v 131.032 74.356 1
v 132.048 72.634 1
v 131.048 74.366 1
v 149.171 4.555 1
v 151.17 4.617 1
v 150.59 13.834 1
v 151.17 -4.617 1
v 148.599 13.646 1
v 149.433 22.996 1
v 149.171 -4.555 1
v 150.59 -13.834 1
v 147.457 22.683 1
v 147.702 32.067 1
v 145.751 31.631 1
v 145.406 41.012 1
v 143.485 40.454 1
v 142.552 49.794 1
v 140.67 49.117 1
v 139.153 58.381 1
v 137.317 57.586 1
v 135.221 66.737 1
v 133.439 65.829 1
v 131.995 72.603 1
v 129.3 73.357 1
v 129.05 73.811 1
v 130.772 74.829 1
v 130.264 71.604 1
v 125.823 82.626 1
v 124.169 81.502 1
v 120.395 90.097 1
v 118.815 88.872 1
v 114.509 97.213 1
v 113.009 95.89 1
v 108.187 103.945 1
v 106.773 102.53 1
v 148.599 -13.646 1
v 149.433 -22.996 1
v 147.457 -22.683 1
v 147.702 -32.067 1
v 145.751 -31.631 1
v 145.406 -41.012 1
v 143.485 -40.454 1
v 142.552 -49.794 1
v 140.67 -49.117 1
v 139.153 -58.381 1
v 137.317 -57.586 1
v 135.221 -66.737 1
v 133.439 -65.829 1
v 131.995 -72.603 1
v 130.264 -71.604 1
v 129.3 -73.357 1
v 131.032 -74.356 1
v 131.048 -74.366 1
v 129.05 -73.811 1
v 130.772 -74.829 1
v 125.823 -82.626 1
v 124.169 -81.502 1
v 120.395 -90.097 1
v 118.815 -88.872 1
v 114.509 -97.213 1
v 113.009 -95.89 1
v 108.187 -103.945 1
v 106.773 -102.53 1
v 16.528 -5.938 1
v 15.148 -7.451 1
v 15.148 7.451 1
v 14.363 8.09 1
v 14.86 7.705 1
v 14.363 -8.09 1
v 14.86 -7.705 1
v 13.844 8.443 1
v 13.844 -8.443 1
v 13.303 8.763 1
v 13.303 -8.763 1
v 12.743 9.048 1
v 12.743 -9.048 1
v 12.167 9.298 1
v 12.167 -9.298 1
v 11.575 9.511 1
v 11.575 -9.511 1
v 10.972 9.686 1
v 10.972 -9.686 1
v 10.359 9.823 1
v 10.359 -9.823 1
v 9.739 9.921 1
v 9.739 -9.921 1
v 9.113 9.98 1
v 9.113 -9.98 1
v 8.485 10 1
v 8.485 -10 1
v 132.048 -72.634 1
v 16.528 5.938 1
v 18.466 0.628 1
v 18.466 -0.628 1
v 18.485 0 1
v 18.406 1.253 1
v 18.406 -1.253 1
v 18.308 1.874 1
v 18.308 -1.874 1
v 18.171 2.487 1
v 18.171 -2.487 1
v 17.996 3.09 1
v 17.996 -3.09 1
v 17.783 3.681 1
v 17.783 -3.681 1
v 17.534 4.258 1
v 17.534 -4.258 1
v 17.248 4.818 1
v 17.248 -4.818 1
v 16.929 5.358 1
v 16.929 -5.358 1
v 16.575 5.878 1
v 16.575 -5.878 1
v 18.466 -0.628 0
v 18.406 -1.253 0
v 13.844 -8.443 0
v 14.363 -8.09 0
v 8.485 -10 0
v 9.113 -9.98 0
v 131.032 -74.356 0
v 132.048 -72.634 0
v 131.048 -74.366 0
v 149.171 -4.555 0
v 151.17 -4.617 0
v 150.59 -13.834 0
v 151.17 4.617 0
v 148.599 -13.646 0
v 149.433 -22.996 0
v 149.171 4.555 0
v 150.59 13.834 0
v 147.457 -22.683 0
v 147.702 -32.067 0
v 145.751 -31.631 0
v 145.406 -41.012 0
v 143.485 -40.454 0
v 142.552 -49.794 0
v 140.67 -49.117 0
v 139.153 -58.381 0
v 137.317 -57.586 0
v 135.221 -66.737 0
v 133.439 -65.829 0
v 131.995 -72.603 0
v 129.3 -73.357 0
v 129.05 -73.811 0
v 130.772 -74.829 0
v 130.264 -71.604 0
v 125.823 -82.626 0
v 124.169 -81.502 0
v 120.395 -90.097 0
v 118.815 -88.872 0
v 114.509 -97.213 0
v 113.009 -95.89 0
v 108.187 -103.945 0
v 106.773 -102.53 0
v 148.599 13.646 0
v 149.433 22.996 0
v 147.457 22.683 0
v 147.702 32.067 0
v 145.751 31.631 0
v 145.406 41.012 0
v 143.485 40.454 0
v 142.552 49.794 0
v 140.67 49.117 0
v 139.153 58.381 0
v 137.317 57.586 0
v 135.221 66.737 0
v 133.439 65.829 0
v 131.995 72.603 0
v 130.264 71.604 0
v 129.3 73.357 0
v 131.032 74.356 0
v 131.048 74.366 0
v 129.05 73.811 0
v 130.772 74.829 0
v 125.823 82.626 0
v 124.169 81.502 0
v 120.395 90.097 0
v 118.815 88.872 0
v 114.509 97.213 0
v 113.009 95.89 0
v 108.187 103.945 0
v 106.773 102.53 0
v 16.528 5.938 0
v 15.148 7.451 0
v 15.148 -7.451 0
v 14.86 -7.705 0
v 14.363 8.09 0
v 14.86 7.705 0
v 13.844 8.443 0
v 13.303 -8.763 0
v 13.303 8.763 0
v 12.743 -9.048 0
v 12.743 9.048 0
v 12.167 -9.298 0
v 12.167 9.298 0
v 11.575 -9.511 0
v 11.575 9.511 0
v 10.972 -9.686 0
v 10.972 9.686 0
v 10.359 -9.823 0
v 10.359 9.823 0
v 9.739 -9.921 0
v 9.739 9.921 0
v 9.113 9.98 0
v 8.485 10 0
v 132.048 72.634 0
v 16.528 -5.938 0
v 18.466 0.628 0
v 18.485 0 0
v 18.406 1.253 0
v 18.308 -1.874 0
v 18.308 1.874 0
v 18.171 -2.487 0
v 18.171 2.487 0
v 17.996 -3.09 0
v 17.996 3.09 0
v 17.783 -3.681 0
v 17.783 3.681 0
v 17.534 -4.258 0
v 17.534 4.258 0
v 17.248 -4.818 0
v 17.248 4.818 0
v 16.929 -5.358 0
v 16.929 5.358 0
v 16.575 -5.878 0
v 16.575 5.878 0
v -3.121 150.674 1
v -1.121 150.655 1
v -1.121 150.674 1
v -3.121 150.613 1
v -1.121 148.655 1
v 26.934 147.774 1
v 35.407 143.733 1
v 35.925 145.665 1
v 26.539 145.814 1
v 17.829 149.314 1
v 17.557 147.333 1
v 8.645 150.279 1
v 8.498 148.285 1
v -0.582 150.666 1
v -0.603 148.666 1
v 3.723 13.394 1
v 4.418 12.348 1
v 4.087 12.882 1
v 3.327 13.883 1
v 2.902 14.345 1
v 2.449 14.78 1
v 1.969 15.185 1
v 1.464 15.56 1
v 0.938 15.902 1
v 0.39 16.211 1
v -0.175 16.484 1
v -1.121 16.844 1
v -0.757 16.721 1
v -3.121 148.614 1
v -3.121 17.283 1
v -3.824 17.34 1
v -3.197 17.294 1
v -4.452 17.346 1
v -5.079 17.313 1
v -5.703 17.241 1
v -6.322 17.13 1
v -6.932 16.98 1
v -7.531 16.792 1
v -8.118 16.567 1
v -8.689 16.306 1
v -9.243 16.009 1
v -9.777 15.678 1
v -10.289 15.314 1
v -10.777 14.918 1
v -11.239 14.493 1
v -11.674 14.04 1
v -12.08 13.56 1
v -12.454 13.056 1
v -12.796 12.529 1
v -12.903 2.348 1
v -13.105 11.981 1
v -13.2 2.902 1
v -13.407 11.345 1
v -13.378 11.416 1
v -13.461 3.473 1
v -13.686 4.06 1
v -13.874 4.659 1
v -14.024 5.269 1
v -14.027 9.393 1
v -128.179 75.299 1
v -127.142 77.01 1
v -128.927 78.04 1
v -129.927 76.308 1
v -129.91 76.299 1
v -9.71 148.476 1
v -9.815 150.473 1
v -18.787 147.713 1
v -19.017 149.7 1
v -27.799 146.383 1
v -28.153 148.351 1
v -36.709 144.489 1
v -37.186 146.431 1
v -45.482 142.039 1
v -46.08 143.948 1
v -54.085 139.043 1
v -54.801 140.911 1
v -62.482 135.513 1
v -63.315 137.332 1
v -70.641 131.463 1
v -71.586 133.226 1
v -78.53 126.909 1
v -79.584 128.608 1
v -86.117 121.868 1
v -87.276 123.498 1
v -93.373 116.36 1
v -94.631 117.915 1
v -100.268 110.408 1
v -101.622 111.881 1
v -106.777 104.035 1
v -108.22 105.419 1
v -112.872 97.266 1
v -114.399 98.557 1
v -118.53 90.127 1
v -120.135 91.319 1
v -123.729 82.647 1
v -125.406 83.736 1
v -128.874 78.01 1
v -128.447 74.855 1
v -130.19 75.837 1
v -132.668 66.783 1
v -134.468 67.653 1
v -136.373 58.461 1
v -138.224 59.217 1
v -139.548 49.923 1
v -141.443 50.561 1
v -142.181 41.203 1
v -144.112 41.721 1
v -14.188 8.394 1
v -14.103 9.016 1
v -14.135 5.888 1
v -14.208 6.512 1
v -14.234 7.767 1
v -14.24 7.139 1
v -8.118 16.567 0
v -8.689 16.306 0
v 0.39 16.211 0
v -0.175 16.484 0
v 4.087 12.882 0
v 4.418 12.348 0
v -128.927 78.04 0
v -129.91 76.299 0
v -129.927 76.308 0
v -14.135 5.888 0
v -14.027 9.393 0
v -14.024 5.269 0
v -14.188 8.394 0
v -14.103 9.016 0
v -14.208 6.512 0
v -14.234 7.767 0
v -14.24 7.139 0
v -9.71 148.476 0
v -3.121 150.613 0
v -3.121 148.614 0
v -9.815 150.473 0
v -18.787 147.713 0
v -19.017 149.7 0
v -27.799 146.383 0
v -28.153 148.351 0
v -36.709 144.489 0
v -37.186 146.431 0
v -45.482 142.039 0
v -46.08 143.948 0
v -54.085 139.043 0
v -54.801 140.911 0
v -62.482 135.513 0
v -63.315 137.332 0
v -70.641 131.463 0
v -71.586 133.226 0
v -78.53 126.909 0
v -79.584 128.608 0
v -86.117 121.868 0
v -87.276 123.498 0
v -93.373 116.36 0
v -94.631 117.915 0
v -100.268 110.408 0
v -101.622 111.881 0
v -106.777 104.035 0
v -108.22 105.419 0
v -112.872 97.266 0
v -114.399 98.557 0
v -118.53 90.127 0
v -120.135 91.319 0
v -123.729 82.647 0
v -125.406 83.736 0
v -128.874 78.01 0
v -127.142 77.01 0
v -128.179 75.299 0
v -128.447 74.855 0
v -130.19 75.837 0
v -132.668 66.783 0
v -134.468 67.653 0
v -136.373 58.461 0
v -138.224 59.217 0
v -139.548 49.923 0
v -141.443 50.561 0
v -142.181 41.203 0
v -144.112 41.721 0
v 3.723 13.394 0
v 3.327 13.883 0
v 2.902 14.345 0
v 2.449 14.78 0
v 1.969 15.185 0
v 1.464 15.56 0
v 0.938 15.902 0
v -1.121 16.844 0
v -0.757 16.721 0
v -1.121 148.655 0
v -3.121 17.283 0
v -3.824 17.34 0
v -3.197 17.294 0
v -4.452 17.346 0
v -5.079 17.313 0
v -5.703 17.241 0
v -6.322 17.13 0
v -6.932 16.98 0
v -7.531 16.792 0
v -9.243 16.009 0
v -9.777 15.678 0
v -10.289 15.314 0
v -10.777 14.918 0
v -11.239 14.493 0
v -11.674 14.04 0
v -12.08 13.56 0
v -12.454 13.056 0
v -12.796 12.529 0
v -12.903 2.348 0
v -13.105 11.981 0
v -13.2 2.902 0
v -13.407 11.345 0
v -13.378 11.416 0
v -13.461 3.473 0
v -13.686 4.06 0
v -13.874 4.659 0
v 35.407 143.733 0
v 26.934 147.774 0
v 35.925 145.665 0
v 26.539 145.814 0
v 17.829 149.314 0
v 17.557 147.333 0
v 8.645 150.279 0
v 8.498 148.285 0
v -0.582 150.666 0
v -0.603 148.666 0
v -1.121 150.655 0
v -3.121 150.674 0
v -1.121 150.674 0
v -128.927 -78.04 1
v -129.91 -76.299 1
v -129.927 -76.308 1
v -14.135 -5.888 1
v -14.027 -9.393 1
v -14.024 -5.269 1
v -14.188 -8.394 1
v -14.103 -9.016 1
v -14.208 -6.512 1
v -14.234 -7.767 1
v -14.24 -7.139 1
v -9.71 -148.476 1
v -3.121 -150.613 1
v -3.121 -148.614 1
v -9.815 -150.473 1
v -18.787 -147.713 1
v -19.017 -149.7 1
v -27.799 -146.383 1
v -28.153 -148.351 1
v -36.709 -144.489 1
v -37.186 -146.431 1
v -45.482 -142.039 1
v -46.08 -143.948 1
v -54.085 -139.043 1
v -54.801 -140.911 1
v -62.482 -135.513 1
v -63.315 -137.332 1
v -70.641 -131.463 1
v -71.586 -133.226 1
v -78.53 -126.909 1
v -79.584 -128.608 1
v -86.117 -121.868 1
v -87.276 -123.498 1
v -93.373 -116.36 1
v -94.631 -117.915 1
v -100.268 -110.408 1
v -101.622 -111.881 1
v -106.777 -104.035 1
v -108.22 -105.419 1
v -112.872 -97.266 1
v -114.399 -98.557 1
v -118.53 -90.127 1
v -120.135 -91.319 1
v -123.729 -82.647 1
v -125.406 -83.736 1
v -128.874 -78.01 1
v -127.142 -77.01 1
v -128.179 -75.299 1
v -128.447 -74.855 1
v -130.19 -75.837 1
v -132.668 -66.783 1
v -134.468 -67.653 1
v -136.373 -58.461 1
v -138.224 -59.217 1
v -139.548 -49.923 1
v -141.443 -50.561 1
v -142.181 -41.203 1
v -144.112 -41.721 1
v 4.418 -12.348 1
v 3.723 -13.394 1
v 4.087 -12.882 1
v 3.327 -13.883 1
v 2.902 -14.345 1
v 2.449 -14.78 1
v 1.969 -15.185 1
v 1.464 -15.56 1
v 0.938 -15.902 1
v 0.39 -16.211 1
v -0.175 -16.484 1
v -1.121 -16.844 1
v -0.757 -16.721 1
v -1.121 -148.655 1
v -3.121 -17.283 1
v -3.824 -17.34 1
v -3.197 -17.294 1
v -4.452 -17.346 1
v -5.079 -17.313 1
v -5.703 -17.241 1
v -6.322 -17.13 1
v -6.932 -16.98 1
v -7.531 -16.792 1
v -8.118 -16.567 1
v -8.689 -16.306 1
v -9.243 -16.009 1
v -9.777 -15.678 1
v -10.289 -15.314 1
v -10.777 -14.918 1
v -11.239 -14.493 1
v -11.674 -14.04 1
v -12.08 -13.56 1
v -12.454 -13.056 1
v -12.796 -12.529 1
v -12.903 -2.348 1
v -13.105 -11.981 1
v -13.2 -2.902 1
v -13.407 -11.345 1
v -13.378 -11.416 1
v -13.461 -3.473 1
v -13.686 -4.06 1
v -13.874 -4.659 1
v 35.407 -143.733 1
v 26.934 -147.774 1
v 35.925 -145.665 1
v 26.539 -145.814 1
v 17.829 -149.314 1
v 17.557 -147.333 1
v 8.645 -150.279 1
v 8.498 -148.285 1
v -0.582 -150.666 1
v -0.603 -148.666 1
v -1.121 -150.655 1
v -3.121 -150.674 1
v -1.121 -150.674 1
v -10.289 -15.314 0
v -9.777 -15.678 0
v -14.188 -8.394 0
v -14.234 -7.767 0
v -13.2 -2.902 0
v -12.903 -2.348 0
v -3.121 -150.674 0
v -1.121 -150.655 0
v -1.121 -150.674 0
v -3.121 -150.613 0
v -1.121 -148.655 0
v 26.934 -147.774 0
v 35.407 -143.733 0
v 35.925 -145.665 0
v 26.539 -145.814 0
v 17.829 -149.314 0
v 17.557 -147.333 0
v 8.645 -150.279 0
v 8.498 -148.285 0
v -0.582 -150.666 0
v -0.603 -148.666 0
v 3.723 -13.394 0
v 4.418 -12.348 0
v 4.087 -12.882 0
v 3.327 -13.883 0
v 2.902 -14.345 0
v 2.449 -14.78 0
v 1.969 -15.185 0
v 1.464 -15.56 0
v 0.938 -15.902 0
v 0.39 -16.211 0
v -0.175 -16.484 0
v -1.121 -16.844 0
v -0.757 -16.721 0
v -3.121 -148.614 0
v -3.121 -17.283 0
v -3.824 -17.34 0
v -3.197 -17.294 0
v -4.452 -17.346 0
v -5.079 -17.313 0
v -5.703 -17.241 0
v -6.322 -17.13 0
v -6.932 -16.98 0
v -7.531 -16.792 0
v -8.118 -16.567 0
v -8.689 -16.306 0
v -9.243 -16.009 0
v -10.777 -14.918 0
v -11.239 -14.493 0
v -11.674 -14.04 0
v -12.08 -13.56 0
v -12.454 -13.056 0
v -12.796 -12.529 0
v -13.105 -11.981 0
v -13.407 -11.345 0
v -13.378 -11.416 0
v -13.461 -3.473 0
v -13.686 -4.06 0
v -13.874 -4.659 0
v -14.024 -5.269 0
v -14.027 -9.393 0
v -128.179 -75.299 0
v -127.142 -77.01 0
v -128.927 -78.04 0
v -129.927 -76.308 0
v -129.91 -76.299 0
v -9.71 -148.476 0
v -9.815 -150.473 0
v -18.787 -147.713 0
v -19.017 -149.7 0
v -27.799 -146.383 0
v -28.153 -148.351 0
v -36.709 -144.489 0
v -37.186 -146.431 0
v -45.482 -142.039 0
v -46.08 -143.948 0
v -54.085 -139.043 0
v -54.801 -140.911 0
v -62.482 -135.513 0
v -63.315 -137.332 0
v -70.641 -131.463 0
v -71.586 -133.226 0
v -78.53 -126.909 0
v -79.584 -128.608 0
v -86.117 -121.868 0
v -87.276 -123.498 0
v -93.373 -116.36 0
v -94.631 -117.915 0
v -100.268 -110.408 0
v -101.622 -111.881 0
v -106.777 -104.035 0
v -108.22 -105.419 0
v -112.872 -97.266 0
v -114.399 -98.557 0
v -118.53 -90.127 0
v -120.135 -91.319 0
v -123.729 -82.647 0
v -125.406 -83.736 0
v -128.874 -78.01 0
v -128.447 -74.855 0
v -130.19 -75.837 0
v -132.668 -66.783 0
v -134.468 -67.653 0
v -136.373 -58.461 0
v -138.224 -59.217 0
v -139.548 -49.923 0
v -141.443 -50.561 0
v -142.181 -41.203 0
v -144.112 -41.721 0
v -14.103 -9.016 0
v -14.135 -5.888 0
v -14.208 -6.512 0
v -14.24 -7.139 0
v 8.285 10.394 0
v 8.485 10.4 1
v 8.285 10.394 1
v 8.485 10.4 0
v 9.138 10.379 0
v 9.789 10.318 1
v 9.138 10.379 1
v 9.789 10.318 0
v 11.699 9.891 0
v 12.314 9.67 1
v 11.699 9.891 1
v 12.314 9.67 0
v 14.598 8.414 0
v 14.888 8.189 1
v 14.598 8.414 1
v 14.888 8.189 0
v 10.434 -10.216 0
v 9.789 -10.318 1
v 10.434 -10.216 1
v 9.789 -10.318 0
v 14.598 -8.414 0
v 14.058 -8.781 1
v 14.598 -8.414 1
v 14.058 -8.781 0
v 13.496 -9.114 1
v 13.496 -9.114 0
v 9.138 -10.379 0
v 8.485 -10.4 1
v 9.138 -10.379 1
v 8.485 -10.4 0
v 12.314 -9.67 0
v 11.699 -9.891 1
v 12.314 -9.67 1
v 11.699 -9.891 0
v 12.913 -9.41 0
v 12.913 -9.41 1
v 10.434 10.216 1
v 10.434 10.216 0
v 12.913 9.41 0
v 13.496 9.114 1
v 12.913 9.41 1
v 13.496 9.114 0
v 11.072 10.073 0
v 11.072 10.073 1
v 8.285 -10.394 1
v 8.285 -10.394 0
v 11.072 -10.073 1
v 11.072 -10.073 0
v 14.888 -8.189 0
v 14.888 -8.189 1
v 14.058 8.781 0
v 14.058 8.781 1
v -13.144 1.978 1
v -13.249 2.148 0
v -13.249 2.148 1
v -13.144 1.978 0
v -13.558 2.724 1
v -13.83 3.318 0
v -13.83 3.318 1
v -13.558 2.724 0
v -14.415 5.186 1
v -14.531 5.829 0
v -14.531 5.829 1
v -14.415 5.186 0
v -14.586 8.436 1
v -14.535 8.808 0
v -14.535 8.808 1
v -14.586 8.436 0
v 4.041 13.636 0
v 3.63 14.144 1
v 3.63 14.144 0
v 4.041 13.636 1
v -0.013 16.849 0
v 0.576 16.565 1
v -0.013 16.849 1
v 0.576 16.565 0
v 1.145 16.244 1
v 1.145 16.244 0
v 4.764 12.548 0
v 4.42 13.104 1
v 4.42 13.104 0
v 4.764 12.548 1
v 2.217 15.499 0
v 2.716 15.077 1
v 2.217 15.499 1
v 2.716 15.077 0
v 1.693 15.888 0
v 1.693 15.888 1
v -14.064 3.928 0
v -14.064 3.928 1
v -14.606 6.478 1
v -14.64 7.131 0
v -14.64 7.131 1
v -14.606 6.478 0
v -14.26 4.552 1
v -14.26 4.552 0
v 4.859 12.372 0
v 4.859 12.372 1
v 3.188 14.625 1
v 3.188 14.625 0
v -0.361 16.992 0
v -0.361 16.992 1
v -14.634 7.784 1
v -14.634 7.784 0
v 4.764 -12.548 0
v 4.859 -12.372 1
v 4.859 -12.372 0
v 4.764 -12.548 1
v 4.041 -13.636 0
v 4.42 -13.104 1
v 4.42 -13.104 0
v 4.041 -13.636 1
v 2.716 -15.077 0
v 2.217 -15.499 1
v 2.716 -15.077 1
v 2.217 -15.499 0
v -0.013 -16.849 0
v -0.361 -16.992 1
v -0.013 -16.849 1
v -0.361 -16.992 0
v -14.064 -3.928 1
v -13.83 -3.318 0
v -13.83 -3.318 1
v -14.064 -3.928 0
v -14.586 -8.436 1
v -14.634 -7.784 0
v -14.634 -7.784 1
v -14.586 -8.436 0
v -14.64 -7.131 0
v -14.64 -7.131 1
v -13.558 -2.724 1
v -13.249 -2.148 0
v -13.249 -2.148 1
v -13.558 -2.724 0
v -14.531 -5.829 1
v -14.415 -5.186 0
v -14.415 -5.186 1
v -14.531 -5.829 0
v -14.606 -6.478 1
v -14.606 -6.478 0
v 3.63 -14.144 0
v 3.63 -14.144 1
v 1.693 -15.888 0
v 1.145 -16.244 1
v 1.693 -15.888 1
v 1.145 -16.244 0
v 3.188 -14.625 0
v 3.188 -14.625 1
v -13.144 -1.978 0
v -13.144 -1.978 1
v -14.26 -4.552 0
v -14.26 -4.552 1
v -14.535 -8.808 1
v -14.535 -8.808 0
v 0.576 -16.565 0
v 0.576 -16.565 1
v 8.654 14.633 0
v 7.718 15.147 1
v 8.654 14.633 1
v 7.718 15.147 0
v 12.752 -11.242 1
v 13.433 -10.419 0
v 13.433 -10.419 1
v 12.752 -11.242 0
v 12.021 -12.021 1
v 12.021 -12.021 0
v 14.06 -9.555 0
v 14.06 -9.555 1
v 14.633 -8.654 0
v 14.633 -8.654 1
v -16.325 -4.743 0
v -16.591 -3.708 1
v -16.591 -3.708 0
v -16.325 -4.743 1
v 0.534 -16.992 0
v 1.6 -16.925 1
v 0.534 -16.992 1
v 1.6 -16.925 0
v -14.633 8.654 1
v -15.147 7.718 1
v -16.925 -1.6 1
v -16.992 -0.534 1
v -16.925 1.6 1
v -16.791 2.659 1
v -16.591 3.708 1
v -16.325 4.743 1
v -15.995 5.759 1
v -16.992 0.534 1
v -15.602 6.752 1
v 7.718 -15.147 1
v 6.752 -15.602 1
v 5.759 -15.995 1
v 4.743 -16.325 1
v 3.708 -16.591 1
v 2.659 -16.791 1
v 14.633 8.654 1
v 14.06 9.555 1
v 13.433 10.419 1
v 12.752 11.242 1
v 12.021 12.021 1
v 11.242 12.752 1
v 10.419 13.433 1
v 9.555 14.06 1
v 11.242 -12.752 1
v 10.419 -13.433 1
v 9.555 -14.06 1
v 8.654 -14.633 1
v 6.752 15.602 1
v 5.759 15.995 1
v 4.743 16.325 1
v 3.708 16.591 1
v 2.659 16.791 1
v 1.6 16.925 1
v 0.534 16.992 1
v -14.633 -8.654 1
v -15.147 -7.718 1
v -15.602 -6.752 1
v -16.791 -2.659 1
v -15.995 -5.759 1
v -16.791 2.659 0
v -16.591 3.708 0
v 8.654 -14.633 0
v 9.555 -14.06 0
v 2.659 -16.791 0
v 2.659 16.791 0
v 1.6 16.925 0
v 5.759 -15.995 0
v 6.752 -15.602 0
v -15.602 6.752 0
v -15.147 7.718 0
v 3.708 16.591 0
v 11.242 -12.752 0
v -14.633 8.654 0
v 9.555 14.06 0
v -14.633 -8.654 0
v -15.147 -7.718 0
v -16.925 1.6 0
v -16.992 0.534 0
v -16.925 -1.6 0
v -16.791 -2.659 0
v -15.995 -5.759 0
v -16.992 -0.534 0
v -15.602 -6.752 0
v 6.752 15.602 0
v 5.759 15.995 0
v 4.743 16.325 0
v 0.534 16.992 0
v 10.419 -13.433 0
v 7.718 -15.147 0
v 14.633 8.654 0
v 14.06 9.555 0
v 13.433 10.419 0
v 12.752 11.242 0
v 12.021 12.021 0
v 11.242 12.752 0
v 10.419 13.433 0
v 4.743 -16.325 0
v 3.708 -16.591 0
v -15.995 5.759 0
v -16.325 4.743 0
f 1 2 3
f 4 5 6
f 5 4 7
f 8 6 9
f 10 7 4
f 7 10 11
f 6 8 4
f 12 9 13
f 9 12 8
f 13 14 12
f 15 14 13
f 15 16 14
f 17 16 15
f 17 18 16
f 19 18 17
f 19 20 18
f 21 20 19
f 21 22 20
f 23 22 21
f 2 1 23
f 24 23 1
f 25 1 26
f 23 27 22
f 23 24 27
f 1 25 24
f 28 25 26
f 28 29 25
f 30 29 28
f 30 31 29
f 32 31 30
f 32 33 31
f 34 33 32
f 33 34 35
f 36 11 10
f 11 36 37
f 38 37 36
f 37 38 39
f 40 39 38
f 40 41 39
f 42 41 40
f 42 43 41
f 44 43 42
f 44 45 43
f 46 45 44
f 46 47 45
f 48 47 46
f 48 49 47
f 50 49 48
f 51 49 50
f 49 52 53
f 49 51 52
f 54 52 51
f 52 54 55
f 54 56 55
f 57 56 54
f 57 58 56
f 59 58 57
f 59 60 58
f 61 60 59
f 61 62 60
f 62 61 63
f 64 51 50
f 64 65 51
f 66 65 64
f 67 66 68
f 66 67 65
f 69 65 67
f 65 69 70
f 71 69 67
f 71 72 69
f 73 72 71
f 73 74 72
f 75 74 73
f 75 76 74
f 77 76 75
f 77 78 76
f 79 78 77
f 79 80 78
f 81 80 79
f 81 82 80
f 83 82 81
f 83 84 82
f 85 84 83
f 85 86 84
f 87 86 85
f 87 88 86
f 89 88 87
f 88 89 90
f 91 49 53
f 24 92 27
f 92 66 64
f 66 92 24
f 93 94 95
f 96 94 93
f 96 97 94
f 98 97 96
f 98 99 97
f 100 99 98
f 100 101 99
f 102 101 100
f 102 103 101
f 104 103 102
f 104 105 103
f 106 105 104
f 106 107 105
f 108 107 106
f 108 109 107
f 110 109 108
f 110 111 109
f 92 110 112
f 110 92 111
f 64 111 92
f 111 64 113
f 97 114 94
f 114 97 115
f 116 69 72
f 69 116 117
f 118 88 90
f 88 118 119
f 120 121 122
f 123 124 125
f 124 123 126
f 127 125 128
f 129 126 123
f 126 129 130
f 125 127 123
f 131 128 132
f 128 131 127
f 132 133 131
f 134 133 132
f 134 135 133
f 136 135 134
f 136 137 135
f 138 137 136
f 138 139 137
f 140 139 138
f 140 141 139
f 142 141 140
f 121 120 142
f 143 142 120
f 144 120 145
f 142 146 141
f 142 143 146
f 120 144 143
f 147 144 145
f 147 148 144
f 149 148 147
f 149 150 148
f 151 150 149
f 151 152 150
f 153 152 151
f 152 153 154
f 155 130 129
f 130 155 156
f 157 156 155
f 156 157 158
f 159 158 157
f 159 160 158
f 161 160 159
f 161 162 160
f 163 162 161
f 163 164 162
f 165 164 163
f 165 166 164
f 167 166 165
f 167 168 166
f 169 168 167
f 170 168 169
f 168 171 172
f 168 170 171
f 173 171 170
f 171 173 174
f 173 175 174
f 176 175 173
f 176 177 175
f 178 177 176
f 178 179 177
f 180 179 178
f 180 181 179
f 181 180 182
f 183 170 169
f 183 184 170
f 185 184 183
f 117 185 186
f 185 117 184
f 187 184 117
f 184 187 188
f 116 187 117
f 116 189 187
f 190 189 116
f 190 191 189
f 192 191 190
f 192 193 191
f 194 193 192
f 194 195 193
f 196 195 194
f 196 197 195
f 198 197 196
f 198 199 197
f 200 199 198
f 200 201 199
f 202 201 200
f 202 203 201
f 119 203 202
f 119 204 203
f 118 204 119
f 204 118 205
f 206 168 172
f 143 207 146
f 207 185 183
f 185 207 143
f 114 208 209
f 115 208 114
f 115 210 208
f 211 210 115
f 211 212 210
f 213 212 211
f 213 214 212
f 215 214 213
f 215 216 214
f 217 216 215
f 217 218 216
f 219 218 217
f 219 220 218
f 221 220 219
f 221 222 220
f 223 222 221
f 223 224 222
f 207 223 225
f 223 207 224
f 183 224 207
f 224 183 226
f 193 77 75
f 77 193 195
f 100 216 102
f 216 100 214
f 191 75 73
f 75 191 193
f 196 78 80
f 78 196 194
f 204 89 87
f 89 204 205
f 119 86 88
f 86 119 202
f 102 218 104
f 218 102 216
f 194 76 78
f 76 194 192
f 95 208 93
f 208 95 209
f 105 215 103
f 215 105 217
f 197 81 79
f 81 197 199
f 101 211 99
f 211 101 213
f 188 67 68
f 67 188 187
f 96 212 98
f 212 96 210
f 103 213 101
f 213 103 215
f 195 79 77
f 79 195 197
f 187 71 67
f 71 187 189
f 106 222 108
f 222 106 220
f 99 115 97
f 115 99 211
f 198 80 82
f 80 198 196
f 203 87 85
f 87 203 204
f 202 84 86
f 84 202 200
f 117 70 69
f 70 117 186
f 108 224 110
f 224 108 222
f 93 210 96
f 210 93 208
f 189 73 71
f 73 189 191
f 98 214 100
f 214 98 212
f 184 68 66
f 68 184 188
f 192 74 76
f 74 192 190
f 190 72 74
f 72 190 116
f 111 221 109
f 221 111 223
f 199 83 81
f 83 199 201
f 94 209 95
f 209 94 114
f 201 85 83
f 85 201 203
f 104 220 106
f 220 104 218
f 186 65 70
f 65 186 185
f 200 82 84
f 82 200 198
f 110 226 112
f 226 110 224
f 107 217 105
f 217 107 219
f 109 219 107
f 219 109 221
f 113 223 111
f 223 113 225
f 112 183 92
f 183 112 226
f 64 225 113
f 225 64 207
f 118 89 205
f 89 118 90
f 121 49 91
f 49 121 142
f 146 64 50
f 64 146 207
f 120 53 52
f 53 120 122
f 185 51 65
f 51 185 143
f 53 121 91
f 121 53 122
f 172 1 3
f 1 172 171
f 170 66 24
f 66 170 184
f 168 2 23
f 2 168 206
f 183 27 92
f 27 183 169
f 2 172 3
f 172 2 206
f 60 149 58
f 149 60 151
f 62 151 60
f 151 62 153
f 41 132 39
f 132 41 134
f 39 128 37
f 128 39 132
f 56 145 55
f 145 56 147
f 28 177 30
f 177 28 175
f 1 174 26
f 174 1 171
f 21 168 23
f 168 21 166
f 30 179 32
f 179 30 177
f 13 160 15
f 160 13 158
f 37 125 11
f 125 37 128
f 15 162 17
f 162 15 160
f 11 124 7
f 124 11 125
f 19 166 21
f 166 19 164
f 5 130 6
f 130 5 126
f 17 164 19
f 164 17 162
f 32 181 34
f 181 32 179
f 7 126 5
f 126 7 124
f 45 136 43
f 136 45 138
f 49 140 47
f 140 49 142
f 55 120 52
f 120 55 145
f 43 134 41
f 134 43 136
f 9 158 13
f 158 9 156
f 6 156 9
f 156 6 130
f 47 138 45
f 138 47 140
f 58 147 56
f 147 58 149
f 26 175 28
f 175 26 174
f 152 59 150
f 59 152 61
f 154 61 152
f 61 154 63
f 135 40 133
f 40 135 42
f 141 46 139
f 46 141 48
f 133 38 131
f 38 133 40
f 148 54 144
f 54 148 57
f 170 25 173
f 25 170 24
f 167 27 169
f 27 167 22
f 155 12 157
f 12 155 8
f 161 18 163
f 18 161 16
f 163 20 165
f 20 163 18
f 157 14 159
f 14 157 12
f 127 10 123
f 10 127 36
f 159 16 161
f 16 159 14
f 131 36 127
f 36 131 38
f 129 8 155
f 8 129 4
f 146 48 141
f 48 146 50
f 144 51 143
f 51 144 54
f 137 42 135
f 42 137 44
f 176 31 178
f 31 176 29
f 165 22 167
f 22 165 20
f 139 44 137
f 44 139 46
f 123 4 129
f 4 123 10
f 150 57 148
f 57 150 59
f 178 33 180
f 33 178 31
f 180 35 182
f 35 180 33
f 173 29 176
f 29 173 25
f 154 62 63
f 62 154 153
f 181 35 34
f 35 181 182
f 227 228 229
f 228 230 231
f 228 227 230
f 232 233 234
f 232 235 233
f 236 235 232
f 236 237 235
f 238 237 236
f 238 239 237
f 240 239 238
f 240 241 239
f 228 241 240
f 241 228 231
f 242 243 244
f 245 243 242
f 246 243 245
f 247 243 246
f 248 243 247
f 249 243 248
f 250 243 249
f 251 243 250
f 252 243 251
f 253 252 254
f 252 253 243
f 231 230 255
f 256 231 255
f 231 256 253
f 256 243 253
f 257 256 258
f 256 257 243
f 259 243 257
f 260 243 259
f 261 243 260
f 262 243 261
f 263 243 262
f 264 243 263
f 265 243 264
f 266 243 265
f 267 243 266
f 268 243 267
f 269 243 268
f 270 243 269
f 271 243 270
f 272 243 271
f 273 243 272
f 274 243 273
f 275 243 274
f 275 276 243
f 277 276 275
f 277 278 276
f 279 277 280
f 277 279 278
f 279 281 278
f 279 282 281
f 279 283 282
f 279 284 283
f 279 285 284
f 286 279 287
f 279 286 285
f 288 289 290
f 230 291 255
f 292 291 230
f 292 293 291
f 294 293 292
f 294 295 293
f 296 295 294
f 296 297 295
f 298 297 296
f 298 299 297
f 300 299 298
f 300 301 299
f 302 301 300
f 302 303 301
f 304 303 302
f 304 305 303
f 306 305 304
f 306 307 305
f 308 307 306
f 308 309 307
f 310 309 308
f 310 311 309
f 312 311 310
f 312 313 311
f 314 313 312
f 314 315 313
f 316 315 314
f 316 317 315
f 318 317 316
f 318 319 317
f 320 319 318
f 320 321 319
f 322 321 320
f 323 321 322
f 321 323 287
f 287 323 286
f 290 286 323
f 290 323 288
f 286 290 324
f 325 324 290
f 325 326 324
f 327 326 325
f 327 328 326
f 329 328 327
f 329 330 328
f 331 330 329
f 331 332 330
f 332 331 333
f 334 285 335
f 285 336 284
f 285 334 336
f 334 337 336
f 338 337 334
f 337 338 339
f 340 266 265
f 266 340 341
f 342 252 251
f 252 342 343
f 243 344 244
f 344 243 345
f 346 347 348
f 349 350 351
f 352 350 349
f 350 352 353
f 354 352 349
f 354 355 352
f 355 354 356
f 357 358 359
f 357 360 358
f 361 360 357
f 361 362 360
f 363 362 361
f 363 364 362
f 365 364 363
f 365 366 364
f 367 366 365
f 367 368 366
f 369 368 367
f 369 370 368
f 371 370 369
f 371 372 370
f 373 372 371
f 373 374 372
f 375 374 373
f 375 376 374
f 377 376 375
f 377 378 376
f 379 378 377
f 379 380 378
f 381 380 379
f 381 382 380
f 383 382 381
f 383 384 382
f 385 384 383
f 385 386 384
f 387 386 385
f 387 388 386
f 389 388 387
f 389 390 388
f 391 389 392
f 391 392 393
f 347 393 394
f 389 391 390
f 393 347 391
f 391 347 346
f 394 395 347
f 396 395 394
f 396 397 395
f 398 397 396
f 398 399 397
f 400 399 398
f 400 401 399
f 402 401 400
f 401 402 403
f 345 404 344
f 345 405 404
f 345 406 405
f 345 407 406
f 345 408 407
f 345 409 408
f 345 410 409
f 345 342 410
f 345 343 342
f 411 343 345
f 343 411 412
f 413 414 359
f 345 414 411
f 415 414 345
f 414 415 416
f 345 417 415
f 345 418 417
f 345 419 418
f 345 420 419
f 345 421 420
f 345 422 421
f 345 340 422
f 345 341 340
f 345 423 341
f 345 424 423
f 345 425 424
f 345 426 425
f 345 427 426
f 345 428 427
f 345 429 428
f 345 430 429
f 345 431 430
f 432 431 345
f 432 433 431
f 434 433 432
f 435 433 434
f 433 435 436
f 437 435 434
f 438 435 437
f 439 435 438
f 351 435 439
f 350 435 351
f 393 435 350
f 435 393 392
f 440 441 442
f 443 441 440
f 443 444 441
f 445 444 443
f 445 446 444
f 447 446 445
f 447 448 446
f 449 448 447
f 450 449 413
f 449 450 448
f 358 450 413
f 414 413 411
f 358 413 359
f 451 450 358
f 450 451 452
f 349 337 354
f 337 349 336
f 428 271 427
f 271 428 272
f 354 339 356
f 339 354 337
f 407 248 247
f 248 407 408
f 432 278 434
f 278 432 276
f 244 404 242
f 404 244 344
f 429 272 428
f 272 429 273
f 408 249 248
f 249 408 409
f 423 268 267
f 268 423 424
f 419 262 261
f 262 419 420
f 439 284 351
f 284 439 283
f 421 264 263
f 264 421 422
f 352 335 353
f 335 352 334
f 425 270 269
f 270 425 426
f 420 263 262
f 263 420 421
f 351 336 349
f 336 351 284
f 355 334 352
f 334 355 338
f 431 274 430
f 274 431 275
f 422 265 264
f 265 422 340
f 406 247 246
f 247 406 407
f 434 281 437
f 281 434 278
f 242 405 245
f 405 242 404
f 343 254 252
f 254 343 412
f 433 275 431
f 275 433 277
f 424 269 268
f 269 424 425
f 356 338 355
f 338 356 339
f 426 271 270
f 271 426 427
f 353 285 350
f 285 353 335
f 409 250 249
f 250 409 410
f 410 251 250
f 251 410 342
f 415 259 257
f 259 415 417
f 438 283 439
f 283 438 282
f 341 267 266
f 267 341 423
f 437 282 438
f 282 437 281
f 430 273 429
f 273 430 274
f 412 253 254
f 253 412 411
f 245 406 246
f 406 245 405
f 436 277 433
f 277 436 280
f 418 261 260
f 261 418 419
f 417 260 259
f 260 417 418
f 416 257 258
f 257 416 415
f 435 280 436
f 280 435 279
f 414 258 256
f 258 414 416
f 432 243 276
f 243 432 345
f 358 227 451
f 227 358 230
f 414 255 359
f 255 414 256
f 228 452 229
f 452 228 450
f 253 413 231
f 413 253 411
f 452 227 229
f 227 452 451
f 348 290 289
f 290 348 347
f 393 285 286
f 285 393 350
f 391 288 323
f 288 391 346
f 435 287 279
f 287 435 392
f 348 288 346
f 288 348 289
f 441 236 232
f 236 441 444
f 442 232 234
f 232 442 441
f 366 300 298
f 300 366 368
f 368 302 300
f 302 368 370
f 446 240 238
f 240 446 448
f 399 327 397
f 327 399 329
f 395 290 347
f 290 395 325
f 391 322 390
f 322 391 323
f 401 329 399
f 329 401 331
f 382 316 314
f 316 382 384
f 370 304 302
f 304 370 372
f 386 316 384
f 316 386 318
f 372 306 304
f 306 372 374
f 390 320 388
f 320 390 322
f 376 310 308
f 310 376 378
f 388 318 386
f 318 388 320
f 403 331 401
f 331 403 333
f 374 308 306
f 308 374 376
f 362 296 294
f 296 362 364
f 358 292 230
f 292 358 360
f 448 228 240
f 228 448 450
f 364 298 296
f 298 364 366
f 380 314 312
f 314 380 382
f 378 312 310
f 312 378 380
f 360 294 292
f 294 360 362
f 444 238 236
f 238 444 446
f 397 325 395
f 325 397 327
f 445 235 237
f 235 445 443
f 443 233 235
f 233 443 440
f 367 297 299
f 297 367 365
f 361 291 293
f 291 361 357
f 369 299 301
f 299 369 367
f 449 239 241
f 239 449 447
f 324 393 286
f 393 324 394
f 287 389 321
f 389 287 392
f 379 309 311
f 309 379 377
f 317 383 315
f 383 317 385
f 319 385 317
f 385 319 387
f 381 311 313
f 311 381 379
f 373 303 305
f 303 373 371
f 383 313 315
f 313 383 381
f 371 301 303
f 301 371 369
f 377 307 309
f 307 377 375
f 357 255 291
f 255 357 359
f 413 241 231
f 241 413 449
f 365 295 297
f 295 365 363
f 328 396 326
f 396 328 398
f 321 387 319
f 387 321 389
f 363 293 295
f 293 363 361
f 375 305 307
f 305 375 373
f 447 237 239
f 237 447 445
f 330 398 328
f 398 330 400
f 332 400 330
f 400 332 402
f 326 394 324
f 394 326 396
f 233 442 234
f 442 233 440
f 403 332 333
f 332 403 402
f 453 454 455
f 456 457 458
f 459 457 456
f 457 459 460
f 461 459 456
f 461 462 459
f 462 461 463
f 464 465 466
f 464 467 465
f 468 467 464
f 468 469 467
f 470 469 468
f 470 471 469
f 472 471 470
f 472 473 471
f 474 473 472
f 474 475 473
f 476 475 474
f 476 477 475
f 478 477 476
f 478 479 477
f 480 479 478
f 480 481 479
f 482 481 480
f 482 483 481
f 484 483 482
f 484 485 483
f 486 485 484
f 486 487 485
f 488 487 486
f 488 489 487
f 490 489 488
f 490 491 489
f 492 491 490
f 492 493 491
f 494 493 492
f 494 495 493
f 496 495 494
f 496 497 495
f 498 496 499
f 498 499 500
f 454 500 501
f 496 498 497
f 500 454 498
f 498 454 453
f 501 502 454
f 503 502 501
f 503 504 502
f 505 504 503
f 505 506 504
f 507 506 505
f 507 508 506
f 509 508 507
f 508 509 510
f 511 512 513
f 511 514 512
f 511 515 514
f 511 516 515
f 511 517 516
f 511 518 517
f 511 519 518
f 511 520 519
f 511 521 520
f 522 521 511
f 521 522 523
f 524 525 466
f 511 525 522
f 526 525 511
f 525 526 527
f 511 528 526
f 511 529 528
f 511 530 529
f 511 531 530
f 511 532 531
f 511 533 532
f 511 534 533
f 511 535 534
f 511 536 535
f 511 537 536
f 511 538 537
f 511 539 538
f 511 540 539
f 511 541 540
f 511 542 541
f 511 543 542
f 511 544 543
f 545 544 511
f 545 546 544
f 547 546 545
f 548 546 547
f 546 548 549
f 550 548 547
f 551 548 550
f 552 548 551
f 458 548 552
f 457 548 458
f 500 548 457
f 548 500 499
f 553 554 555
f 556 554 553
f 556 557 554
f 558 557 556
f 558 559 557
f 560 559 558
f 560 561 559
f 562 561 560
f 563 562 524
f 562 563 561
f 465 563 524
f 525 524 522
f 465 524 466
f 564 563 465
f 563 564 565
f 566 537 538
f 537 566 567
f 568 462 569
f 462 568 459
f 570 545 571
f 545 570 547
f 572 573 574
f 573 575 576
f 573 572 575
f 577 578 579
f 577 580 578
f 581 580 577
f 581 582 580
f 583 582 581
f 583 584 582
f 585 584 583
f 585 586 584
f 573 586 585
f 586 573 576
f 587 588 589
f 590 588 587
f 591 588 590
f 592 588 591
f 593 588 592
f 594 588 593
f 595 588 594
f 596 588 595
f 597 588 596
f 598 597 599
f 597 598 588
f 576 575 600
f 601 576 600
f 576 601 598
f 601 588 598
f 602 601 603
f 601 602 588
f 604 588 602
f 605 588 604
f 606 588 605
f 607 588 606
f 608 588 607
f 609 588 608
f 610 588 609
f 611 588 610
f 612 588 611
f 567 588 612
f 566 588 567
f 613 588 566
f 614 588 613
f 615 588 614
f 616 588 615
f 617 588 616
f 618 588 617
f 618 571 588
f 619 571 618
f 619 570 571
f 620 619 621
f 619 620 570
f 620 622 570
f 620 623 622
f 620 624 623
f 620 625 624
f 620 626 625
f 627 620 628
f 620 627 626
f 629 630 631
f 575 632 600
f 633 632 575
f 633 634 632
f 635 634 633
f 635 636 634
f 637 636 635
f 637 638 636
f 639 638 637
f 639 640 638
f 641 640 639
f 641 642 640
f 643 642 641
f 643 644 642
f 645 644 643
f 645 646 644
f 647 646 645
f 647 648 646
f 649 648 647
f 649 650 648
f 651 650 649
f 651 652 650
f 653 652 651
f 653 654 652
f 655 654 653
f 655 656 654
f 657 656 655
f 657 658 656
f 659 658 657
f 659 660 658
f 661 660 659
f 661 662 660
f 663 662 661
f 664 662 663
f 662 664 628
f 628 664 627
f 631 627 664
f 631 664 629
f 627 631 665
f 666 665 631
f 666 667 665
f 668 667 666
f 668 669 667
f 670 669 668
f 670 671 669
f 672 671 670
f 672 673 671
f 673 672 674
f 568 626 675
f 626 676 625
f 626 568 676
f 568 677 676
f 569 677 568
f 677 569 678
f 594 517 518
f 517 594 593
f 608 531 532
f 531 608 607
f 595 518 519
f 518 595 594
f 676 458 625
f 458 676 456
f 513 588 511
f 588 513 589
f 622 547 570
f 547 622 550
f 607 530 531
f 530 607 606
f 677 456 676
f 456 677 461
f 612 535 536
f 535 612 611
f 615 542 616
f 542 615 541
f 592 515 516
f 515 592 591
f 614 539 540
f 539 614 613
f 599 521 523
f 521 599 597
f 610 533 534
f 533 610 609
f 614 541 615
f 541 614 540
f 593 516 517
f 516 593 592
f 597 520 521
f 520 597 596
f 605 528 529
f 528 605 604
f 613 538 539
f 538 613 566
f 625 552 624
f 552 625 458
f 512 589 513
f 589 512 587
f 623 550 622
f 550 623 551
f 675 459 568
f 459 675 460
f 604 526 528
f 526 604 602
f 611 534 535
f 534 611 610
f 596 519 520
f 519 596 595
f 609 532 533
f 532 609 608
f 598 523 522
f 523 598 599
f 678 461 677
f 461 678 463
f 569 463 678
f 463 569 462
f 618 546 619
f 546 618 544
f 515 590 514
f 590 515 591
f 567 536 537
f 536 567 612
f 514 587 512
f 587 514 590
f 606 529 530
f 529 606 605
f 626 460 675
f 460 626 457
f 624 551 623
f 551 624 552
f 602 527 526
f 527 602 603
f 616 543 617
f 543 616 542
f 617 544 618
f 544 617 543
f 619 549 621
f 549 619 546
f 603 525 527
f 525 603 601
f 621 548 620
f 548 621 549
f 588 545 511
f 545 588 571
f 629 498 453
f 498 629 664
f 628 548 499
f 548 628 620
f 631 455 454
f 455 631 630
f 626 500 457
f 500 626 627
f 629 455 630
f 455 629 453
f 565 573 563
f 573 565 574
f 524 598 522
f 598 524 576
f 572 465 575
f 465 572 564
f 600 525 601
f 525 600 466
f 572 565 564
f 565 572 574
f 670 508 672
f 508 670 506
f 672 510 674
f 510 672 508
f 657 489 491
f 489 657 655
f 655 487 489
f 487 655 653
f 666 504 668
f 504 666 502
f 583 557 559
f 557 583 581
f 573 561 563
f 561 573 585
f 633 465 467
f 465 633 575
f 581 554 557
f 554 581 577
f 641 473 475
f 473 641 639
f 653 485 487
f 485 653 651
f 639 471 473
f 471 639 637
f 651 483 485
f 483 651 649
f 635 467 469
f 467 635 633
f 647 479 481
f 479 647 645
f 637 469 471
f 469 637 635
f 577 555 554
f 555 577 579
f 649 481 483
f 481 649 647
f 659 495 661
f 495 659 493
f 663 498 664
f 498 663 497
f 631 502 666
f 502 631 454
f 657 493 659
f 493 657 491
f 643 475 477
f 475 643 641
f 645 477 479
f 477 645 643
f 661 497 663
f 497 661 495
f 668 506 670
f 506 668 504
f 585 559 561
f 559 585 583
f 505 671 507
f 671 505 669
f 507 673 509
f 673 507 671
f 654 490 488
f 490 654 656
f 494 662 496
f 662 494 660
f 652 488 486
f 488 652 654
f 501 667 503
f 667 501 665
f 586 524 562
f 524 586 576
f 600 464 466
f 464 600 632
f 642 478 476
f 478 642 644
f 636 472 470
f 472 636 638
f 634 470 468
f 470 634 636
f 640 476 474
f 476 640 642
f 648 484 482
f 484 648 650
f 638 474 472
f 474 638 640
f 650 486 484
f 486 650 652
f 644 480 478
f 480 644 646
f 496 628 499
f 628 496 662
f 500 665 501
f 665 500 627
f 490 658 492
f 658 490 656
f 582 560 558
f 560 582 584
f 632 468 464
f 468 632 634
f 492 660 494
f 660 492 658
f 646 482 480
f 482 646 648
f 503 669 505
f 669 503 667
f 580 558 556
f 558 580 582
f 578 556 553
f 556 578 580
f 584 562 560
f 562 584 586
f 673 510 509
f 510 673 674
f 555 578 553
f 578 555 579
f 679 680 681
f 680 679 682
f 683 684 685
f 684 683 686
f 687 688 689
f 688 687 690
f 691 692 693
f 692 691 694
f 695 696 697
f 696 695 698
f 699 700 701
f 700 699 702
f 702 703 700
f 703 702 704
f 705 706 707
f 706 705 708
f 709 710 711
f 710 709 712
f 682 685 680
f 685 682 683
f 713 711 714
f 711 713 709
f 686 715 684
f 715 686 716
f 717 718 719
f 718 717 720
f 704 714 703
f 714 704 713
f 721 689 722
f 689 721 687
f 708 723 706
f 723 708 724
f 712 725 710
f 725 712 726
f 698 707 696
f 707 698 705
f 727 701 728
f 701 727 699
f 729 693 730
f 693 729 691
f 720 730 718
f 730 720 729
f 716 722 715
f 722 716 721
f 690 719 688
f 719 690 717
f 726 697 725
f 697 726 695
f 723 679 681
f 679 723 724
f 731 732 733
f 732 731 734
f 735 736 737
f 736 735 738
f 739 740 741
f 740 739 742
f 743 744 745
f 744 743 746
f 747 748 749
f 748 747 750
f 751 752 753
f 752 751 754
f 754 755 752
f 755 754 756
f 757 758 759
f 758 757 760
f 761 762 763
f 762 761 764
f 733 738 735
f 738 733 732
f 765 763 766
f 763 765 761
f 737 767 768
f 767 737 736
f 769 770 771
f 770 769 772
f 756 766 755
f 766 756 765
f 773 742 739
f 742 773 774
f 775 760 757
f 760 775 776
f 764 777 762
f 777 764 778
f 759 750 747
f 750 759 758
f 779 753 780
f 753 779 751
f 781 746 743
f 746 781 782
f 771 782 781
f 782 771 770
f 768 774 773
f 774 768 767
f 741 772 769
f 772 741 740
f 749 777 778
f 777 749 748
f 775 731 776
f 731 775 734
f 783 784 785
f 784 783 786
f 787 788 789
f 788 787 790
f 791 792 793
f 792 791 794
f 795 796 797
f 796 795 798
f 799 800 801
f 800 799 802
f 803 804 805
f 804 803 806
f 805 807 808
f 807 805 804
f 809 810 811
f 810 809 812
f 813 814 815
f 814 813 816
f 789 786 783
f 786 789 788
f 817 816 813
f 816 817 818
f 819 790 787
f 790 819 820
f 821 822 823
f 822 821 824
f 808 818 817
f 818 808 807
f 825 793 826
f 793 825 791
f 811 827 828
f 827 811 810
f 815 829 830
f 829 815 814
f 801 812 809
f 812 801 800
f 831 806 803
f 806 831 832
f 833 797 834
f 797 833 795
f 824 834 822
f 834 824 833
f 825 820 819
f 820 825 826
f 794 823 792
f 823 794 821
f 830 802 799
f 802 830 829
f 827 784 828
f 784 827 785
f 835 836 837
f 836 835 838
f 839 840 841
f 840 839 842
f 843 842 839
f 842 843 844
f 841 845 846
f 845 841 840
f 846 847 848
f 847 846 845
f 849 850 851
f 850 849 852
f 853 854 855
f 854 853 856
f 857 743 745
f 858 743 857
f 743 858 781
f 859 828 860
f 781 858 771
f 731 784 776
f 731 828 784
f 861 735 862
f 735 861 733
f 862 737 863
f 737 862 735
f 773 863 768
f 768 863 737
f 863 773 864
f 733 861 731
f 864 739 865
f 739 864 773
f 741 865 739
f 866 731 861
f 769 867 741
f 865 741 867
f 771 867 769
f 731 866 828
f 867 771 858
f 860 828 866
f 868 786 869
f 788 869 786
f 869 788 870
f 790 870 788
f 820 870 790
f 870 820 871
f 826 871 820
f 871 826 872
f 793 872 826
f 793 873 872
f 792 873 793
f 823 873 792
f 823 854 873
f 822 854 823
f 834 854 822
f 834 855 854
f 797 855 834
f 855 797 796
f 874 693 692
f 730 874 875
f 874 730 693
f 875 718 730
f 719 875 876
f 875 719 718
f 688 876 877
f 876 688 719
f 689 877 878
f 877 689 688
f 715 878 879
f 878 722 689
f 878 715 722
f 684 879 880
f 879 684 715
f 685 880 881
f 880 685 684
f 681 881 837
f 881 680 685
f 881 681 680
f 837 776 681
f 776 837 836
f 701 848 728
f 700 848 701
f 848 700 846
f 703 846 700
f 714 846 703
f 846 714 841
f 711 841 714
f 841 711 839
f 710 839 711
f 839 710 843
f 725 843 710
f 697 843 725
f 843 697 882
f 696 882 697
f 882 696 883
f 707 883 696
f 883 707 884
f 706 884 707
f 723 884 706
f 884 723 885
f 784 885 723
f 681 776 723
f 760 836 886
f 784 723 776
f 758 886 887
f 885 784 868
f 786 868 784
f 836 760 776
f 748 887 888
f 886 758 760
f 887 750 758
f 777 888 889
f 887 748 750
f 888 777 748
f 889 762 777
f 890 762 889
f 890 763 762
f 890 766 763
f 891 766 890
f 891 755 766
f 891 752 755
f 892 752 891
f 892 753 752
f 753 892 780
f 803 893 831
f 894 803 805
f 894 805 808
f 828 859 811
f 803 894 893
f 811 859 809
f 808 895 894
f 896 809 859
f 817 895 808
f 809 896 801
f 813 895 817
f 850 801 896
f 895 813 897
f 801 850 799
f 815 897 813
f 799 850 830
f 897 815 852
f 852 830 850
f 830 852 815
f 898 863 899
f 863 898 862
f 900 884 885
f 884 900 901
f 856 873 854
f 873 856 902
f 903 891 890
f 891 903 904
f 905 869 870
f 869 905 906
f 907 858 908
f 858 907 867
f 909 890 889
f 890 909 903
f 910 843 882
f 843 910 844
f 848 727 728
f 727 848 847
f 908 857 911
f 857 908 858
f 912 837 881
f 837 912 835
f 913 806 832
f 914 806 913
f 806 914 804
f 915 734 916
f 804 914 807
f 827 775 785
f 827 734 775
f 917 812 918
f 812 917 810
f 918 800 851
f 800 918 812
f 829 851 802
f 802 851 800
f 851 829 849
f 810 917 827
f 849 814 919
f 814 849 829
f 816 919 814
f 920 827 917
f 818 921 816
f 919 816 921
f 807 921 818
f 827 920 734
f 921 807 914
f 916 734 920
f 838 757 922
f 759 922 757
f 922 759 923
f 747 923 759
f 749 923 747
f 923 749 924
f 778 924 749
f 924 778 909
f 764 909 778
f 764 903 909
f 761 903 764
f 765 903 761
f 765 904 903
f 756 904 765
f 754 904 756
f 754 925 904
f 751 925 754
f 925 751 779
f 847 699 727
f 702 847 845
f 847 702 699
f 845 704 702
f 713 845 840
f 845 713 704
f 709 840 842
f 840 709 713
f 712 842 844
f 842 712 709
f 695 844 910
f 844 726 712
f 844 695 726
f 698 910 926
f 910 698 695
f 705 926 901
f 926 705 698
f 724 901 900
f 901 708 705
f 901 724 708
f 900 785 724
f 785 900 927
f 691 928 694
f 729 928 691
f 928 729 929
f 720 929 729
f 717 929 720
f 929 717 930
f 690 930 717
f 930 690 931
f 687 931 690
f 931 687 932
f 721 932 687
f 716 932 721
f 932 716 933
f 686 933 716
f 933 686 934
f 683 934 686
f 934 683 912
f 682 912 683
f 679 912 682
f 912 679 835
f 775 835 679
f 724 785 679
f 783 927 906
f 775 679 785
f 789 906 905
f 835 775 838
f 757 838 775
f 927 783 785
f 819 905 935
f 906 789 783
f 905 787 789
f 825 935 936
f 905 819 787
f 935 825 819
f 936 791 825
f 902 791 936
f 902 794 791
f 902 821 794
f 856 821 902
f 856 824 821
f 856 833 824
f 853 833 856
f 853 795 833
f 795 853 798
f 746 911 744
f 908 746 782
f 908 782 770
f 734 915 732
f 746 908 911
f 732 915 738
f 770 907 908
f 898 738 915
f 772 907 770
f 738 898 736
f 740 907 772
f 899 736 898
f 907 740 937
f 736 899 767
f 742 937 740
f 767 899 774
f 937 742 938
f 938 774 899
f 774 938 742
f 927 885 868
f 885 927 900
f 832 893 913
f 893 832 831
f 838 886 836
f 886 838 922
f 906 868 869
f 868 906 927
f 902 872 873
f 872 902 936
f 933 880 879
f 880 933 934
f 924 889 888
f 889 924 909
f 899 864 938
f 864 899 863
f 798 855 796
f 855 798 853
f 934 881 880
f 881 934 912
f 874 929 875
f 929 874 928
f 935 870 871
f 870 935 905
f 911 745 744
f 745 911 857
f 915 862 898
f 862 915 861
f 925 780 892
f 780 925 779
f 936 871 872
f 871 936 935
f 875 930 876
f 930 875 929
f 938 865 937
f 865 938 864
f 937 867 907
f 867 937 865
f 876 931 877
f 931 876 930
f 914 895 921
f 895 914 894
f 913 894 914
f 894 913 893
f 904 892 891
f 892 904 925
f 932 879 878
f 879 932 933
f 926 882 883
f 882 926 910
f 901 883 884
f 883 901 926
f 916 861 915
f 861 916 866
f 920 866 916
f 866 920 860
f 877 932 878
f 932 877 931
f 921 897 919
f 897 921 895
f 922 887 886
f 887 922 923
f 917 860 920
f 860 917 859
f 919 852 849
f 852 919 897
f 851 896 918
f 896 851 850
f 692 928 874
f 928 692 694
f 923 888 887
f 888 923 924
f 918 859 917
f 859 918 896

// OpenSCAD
// -----------------------------------------------------
// BlumentopfUntersatz
//
//  Detlev Ahlgrimm, 08.2018
// -----------------------------------------------------

// Diameter
dia=300;  // [50:380]

// Height
hgt=1;    // [1:5]

render=0; //  [0:all together/assembled, 1:arm part, 2:center part, 3:center part + 140mm, 4:all together + 140mm]

/* [Hidden] */
$fn=100;
wt=2;


// -----------------------------------------------------
//   r : Radius (innen)
//   w : Wandstaerke
//   h : Hoehe
// -----------------------------------------------------
module Rohr(r, w, h) {
  difference() { cylinder(r=r+w, h=h); translate([0, 0, -0.1]) cylinder(r=r, h=h+0.2); }
}


// -----------------------------------------------------
//
// -----------------------------------------------------
module UntersatzDrittel() {
  translate([3, 3, 0]) rotate([0, 0, -45+180]) difference() {
    cylinder(r=10, hgt);
    translate([-10, 0, -0.1]) cube([20, 10, hgt+0.2]);
  }
  for(a=[15, 75]) {
    rotate([0, 0, a]) translate([10, -wt/2, 0]) cube([dia/2-10-3, wt, hgt]);
  }
  difference() {
    Rohr(dia/2-wt-3, wt, hgt);
    translate([-dia/2, -dia/2, -0.1]) cube([dia, dia/2, hgt+0.2]);
    translate([-dia/2, -0.1, -0.1]) cube([dia/2, dia/2+0.2, hgt+0.2]);
  }
}
//!rotate([0, 0, -15]) UntersatzDrittel();
//!UntersatzDrittel();


// -----------------------------------------------------
//
// -----------------------------------------------------
module Untersatz() {
  for(a=[0:120:359]) {
    rotate([0, 0, a]) translate([3, 3, 0]) UntersatzDrittel();
  }
}


// -----------------------------------------------------
//
// -----------------------------------------------------
module Untersatz_plus140mm(lng=49) {
  for(a=[0:120:359]) {
    rotate([0, 0, a]) translate([lng+3, lng+3, 0]) UntersatzDrittel();
  }
}


// -----------------------------------------------------
//
// -----------------------------------------------------
module Verbinder() {
  difference() {
    cylinder(r=17, h=hgt);
    for(a=[0:120:359]) {
      rotate([0, 0, a]) translate([6, 6, -0.1]) rotate([0, 0, -45+180]) difference() {
        cylinder(r=10.4, hgt+0.2);
        translate([-11, 0.2, -0.1]) cube([22, 11, hgt+0.4]);
      }
    }
  }
}


// -----------------------------------------------------
//
// -----------------------------------------------------
module Verbinder_plus140mm(lng=49) {
  difference() {
    for(a=[0:120:359]) {
      rotate([0, 0, a]) translate([lng, lng, 0]) rotate([0, 0, -45+180]) difference() {
        cylinder(r=17, h=hgt);
        translate([-18, 0, -0.1]) cube([36, 18, hgt+0.4]);
      }
    }
    for(a=[0:120:359]) {
      rotate([0, 0, a]) translate([lng+6, lng+6, -0.1]) rotate([0, 0, -45+180]) difference() {
        cylinder(r=10.4, hgt+0.2);
        translate([-11, 0.2, -0.1]) cube([22, 11, hgt+0.4]);
      }
    }
  }
  cylinder(d=10, h=hgt);
  for(a=[0:120:359]) {
    hull() {
      cylinder(d=wt, h=hgt);
      rotate([0, 0, a]) translate([lng, lng, 0]) rotate([0, 0, -45+180]) cylinder(d=wt, h=hgt);
    }
  }
}



if(render==0) {
  rotate([0, 0, -45]) Untersatz();
  rotate([0, 0, -45]) Verbinder();
} else if(render==1) {
  translate([4, 4, 0]) UntersatzDrittel();
} else if(render==2) {
  Verbinder();
} else if(render==3) {
  Verbinder_plus140mm();
} else if(render==4) {
  rotate([0, 0, -45]) Untersatz_plus140mm();
  rotate([0, 0, -45]) Verbinder_plus140mm();
}
